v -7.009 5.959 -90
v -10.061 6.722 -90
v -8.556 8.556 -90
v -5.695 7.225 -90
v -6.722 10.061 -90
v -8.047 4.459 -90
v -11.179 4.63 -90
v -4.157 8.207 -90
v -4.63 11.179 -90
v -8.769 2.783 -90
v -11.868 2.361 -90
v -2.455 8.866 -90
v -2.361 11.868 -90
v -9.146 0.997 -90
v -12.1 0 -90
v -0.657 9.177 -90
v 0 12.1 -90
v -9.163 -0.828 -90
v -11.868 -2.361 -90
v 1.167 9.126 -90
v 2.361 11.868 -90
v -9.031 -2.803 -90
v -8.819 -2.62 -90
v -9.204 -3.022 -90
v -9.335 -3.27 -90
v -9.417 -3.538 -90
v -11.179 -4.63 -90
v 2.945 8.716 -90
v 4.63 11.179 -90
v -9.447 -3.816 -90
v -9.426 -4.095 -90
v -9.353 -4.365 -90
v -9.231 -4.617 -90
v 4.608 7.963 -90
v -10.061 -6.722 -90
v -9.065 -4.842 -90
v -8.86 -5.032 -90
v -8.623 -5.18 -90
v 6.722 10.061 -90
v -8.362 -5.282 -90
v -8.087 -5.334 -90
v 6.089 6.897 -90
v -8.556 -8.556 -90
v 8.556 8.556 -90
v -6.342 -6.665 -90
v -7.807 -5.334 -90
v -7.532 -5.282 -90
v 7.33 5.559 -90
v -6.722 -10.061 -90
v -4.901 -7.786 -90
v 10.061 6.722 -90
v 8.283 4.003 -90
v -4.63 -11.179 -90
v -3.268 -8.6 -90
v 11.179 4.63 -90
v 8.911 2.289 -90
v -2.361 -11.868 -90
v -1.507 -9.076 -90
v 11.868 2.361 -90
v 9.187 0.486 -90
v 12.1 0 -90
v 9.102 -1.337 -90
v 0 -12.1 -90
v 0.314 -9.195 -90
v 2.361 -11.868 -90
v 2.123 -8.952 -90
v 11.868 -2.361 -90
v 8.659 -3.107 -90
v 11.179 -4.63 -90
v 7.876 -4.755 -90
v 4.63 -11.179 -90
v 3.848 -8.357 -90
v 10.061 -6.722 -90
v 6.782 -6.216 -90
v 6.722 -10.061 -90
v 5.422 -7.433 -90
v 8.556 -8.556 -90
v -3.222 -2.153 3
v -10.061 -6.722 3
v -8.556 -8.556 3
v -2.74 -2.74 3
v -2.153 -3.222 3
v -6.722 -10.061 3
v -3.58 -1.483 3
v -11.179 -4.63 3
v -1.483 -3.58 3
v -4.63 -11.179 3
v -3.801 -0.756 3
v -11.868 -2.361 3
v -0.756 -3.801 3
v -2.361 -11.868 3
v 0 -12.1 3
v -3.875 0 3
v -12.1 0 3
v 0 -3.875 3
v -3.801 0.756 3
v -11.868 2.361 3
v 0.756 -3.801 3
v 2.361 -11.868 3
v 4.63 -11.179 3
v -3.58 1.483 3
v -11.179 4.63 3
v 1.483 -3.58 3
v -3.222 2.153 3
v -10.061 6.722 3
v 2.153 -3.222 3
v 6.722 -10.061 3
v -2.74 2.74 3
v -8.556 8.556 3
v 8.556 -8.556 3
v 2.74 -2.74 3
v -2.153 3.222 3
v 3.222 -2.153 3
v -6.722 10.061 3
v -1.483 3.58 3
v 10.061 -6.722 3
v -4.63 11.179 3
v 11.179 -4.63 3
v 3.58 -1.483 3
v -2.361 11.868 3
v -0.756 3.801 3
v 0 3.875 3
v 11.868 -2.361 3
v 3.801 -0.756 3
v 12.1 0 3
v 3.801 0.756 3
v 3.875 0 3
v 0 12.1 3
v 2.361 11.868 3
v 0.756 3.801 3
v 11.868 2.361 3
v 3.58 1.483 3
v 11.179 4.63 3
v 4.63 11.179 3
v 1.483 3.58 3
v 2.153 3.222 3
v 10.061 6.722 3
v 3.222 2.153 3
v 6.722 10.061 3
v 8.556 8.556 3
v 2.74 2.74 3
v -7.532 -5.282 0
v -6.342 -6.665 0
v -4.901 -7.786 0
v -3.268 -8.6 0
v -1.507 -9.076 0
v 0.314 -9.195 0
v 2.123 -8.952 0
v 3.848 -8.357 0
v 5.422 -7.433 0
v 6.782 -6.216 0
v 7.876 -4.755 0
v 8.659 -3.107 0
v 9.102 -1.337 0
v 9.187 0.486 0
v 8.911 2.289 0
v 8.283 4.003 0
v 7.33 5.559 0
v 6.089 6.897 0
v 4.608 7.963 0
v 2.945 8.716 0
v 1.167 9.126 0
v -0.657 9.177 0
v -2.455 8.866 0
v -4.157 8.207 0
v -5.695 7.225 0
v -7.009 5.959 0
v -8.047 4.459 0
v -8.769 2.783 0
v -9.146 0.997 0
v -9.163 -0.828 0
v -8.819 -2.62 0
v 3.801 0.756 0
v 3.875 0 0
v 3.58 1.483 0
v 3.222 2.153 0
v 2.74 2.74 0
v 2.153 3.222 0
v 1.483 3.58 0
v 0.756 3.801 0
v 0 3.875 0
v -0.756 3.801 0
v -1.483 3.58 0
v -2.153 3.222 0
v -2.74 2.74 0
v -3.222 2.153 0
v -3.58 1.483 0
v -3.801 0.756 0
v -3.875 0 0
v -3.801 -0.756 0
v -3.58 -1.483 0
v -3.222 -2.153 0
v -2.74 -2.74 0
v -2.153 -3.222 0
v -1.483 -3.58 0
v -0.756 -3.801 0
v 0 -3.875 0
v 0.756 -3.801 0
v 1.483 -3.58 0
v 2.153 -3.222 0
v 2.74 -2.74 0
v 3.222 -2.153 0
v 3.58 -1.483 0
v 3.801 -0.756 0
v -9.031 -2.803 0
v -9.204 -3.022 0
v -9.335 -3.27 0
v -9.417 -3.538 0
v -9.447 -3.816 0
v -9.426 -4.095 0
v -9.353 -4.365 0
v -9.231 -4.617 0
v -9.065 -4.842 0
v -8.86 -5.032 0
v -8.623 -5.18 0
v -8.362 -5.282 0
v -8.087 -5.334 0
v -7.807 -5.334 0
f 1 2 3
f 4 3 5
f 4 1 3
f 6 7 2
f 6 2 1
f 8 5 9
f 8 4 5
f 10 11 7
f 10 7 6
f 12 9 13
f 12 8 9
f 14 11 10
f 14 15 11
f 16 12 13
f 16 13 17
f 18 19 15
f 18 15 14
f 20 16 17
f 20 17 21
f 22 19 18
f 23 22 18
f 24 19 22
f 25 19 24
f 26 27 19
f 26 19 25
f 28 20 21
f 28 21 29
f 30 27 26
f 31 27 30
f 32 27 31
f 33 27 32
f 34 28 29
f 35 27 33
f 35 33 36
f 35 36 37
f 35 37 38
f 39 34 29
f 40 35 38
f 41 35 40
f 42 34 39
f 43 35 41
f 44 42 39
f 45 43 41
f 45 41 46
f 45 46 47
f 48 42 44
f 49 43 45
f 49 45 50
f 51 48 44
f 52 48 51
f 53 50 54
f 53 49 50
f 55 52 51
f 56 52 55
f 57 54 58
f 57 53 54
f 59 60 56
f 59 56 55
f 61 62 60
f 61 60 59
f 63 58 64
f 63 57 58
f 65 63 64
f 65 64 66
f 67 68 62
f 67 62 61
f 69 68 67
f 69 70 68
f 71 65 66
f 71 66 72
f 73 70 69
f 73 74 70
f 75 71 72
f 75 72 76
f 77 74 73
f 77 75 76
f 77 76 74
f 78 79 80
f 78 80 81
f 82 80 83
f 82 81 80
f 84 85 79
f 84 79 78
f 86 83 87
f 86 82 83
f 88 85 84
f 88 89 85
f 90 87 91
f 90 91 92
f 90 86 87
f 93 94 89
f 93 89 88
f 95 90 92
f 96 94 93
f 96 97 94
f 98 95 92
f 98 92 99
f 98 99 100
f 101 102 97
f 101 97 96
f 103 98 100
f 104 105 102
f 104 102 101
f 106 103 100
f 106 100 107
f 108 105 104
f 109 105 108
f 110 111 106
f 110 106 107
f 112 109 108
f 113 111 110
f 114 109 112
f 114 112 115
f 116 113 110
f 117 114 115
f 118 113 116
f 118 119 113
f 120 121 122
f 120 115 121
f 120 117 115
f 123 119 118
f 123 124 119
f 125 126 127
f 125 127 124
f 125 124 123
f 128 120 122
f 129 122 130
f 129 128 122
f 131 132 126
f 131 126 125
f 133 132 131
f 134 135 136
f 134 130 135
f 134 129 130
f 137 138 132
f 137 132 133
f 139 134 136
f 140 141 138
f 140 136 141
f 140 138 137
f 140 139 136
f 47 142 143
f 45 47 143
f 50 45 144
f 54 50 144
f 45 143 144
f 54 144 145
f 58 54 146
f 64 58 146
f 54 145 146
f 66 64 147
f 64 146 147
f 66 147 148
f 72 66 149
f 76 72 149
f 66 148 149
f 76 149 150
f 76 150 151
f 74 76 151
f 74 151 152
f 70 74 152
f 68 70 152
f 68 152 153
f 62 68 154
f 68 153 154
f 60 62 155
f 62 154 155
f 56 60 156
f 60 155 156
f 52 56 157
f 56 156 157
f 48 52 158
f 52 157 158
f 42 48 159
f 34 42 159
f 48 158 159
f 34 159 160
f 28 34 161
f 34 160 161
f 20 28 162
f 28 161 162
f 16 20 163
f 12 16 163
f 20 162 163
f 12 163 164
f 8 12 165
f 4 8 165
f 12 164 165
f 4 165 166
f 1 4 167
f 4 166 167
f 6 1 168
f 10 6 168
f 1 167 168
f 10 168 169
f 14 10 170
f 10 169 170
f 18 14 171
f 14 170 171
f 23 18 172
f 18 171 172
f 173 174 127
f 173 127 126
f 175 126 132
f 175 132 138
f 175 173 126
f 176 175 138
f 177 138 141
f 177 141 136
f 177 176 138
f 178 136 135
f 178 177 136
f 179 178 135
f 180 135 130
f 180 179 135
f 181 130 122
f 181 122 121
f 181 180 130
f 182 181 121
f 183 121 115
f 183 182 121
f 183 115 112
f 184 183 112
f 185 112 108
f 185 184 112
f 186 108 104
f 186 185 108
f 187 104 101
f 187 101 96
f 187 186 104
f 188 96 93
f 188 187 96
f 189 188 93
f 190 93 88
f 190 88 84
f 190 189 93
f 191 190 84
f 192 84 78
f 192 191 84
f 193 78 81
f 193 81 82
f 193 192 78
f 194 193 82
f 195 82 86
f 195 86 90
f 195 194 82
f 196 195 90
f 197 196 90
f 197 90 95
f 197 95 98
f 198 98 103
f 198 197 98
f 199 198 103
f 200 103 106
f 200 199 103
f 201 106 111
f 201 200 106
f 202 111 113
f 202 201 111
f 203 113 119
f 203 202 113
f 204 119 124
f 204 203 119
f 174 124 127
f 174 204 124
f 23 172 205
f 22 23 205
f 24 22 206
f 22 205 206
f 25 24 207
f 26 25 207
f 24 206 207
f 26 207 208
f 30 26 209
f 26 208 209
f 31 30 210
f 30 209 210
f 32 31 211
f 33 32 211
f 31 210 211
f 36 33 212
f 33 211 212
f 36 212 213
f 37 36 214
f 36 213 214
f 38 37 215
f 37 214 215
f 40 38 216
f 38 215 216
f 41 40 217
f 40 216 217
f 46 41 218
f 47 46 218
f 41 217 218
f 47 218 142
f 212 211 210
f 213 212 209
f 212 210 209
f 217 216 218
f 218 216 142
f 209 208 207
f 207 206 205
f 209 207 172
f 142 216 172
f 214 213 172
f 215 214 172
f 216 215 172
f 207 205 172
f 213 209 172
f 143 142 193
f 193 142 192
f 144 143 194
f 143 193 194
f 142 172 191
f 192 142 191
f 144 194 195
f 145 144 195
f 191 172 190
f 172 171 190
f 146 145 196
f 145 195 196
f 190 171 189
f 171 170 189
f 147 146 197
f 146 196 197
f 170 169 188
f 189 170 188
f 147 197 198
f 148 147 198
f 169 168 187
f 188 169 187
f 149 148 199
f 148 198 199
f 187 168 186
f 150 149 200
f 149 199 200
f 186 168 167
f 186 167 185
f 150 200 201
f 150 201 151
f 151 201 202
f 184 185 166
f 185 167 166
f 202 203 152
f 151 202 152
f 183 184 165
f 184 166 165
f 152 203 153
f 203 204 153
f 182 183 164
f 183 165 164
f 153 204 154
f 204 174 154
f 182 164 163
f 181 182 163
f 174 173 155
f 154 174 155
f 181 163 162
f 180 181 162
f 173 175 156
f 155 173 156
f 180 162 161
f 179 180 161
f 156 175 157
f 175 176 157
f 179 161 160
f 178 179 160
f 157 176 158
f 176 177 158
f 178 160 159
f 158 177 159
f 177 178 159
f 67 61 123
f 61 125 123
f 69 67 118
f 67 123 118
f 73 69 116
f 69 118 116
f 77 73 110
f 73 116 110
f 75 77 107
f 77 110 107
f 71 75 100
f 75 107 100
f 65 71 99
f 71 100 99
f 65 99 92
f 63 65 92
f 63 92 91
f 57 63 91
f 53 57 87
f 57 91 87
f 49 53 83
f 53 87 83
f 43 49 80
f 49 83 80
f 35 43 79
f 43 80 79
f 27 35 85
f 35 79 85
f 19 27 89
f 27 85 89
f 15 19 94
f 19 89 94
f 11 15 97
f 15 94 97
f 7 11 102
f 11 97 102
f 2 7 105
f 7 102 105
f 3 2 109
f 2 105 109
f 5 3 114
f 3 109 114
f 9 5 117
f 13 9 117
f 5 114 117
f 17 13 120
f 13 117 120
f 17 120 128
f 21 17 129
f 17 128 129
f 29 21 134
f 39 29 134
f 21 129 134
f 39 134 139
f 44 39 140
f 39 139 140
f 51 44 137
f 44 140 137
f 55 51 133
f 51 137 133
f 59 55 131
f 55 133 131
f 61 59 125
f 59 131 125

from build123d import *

# Parameters (mm, degrees)
F0_R     = 12.1
F0_R_2   = 3.875
F1_DEPTH = 3
F2_R     = 12.1
F3_DEPTH = 90


with BuildPart() as f1:
    # F0 (on Top) → F1 (new body)
    with BuildSketch(Plane.XY):
        Circle(F0_R)
        Circle(F0_R_2, mode=Mode.SUBTRACT)
    extrude(amount=F1_DEPTH)

    # F2 (on face) → F3 (join)
    with BuildSketch(Plane(origin=(0, 0, 0), x_dir=(1, 0, 0), z_dir=(0, 0, -1))):
        Circle(F2_R)
        with BuildLine():
            ThreePointArc((-8.819044, 2.620012), (-9.298069, 4.493539), (-7.532436, 5.282274))
            ThreePointArc((-7.532436, 5.282274), (8.283395, -4.00317), (-8.819044, 2.620012))
        make_face(mode=Mode.SUBTRACT)
    extrude(amount=F3_DEPTH)


solid = f1.part
